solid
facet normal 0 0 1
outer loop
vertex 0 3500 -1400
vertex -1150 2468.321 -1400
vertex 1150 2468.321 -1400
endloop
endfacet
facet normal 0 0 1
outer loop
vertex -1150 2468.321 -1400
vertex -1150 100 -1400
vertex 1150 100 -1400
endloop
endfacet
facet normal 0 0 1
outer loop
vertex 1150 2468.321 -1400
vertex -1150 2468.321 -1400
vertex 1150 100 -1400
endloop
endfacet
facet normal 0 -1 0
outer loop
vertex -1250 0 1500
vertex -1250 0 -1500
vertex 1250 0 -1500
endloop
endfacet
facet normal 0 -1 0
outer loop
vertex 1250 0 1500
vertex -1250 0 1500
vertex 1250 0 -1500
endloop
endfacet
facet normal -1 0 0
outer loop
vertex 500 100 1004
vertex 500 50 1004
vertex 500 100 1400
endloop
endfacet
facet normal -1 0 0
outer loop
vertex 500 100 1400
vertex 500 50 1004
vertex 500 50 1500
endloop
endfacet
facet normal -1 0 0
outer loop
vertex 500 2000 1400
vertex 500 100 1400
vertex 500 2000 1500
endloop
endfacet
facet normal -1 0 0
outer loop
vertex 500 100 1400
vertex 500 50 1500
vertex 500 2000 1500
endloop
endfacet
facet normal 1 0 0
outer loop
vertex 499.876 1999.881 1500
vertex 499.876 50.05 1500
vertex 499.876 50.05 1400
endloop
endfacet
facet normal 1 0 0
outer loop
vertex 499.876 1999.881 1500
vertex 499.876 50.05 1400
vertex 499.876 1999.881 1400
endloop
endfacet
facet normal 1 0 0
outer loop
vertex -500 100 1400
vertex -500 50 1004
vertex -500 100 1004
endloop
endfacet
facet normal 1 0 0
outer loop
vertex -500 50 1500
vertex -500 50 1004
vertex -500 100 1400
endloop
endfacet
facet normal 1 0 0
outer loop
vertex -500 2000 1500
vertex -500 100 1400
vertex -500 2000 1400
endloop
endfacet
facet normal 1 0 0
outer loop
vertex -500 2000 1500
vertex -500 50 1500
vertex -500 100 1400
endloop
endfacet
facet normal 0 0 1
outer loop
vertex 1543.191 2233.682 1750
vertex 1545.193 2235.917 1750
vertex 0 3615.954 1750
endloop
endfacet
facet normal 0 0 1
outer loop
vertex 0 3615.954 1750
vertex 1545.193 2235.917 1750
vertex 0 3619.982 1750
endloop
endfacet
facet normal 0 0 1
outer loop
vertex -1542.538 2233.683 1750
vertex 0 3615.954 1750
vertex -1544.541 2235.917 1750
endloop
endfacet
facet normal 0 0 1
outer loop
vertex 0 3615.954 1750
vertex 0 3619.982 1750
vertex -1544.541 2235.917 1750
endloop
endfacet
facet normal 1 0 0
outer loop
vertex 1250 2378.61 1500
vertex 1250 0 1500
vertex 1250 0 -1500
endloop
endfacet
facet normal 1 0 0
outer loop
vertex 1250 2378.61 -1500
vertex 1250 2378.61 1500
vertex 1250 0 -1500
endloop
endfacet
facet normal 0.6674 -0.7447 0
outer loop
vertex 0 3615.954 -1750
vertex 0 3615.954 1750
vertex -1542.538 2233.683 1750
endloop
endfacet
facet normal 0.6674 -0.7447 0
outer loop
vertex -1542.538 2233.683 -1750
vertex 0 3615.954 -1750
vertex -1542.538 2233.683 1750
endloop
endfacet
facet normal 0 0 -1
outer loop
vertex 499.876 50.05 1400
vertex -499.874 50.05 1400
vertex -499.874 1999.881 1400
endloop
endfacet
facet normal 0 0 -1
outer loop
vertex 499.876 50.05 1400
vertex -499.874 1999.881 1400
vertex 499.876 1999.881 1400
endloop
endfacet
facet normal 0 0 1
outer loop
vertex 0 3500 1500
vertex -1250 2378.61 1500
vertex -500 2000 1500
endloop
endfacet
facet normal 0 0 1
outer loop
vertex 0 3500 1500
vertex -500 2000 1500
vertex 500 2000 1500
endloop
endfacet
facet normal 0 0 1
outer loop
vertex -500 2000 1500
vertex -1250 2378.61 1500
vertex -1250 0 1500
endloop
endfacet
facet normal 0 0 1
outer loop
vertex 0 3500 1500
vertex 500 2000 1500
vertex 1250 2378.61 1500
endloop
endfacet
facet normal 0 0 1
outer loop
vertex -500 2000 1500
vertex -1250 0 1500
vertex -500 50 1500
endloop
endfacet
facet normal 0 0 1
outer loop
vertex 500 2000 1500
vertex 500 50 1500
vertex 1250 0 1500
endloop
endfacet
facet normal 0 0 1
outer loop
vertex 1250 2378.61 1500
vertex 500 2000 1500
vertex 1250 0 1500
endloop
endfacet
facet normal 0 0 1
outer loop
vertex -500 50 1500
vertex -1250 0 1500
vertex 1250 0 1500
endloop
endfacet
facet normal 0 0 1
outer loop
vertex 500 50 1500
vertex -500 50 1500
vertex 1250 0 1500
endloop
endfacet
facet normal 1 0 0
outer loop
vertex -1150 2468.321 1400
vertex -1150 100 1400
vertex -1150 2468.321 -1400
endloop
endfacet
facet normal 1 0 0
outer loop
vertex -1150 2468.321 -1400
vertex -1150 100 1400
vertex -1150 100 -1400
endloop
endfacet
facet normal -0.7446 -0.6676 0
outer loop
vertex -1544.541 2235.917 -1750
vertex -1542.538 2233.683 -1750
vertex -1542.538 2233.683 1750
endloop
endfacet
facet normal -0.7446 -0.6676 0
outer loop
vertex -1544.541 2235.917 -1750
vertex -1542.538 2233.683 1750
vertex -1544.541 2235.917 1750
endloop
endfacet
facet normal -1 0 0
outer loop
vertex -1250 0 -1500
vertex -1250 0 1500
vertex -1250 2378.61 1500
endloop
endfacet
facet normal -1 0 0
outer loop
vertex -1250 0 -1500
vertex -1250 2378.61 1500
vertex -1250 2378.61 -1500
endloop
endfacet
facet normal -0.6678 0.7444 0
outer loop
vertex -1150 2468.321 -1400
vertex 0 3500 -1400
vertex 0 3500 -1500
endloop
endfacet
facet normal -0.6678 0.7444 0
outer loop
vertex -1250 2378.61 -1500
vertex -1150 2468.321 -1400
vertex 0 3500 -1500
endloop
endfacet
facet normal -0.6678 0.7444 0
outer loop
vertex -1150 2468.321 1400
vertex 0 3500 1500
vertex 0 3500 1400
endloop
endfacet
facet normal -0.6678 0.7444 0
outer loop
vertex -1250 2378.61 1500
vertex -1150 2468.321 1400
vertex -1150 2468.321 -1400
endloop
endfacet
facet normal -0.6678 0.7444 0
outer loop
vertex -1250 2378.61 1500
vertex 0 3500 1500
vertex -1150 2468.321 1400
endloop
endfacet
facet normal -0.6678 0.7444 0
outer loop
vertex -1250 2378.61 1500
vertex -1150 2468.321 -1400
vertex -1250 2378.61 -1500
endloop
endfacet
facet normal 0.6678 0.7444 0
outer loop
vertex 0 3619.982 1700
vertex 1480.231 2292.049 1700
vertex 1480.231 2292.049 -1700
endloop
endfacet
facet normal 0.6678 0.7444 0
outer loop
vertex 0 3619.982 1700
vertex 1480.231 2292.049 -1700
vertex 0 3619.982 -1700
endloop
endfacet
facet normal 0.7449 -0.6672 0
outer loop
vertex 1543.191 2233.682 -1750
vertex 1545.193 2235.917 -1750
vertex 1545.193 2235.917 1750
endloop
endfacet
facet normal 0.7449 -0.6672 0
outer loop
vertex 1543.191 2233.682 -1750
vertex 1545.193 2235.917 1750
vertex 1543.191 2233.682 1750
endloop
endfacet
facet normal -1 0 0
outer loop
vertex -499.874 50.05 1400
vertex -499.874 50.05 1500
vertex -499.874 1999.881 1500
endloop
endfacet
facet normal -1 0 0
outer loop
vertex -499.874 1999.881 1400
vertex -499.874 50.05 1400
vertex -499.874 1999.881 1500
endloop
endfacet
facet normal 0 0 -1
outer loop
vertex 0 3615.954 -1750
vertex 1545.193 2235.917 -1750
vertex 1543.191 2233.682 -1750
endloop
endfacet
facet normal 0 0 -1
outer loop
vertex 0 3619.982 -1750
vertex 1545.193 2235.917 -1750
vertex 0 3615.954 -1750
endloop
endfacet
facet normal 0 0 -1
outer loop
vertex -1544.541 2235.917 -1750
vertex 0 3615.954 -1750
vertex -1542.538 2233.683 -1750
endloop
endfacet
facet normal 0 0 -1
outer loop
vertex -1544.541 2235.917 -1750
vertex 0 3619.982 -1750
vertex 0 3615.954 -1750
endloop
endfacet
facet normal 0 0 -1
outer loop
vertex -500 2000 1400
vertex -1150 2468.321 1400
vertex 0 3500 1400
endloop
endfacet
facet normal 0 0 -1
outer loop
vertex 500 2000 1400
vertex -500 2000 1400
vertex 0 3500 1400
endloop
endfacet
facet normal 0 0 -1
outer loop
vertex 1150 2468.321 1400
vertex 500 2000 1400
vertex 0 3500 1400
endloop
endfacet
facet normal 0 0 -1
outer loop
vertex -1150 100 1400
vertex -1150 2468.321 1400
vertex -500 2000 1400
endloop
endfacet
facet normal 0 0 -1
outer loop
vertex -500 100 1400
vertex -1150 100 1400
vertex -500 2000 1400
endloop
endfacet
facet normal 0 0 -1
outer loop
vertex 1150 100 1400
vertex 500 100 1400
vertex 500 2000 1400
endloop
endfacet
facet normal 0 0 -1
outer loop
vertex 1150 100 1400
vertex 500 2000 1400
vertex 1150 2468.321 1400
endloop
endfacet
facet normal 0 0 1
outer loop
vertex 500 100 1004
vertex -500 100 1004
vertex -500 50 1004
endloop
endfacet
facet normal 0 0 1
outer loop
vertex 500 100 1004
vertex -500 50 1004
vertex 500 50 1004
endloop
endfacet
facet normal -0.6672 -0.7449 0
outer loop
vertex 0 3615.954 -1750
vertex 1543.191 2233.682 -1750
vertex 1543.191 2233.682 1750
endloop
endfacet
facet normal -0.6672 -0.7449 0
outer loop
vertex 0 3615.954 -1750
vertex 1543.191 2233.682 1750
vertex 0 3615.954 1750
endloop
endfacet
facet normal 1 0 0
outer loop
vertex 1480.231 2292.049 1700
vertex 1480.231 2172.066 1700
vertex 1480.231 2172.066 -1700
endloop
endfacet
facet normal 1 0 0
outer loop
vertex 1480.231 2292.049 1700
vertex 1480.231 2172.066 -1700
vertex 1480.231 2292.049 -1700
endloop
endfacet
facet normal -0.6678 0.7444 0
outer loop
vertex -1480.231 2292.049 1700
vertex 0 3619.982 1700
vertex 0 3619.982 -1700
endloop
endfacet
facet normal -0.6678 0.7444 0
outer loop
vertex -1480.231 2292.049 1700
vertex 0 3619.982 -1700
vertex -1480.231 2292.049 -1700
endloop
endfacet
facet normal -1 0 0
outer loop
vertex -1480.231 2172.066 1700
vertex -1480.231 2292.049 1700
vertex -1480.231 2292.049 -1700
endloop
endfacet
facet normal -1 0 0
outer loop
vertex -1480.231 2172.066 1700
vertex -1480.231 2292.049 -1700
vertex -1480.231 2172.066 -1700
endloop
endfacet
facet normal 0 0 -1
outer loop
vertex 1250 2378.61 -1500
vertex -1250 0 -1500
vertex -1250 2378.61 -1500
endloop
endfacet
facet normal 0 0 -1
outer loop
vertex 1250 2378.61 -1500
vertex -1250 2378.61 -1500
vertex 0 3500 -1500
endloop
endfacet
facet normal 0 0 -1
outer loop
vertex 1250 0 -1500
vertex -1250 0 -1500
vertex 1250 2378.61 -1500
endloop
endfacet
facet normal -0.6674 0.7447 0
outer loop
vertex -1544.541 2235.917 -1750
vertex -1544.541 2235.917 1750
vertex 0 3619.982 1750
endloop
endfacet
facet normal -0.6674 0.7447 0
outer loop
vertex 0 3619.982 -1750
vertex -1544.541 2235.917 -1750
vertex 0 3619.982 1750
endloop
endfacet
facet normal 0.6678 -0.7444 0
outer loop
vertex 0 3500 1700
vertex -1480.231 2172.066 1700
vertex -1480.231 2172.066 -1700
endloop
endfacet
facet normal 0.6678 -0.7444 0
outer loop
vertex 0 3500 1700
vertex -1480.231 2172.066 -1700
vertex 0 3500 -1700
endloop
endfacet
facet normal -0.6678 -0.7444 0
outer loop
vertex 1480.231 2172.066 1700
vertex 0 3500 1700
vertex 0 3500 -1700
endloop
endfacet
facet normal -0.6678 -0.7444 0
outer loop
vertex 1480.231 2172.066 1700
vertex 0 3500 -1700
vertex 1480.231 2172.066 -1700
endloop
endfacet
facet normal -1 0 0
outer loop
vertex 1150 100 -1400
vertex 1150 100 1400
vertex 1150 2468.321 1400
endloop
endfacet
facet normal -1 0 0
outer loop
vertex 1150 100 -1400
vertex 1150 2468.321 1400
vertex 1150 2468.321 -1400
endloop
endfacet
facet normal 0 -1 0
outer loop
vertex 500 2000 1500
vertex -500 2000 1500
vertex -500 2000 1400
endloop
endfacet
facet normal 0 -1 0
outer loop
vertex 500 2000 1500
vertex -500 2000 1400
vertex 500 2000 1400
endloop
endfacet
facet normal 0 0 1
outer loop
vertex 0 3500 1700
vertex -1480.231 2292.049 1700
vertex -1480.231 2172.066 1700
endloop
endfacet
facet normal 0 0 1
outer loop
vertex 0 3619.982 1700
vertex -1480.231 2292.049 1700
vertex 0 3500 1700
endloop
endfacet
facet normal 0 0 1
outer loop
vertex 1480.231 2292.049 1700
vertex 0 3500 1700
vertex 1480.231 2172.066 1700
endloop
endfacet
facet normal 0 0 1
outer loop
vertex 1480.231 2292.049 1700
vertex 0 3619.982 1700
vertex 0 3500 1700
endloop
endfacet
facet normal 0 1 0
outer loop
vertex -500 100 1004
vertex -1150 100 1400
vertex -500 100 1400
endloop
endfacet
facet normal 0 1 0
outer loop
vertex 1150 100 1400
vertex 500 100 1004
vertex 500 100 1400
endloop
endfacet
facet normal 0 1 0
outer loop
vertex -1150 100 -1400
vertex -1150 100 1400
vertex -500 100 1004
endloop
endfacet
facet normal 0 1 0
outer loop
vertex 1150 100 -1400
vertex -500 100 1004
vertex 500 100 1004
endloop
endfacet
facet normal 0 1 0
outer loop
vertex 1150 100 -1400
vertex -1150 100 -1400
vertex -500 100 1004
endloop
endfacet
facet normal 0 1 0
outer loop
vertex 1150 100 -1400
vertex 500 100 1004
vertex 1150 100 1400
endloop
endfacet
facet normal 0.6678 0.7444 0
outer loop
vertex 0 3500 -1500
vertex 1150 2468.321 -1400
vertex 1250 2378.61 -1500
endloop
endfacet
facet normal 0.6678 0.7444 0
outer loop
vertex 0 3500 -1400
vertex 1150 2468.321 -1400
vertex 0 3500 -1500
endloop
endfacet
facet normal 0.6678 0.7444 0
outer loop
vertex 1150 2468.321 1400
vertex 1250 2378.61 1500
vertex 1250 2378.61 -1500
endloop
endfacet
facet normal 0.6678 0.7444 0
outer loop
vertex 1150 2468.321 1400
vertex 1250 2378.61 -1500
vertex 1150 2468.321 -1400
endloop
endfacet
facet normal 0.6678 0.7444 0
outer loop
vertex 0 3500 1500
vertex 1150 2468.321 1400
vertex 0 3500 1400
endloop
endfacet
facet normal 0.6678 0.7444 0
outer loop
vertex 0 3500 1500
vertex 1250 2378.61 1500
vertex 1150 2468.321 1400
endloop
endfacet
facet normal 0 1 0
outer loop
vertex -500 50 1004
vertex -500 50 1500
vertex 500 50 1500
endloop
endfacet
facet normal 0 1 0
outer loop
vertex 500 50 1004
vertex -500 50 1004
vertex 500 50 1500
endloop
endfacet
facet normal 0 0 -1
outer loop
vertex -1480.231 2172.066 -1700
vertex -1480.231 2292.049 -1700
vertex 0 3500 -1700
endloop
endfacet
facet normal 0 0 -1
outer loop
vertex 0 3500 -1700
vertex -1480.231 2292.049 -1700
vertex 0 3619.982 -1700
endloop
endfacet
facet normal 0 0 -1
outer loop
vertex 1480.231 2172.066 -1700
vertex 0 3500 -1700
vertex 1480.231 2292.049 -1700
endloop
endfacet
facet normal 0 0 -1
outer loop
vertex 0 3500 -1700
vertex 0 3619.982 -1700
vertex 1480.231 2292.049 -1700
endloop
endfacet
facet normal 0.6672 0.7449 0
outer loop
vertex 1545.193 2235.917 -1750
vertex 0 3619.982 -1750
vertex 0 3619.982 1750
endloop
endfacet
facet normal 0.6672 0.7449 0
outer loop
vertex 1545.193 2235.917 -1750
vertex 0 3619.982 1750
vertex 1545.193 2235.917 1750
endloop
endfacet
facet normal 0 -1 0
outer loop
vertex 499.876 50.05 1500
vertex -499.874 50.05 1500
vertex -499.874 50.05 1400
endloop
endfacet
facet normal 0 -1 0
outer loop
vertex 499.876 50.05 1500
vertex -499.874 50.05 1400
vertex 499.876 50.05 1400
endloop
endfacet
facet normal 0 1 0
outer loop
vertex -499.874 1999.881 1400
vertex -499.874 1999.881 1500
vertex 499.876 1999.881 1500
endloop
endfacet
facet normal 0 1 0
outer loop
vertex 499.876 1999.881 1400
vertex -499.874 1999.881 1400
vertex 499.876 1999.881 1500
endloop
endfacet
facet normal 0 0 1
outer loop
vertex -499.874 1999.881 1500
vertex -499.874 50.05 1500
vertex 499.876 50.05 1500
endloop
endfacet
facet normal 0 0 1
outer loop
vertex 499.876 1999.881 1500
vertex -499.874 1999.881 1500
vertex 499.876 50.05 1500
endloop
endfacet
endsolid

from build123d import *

# Parameters (mm, degrees)
SKETCH1_W                = 2500
SKETCH1_H                = 3000
BOSS_EXTRUDE1_DEPTH      = 3500
CUT_EXTRUDE1_DEPTH       = 3500
SHELL1_T                 = -100
SKETCH3_W                = 1000
SKETCH3_H                = 1950
CUT_EXTRUDE3_DEPTH       = 496
SKETCH4_W                = 999.750286032
SKETCH4_H                = 1949.830893164
BOSS_EXTRUDE2_DEPTH      = 100
BOSS_EXTRUDE3_DEPTH      = 200
BOSS_EXTRUDE3_DEPTH_BACK = 3200
EXTRUDE_THIN1_DEPTH      = 50
EXTRUDE_THIN1_DEPTH_BACK = 3450


with BuildPart() as part:
    # Sketch1 → Boss-Extrude1 (new body)
    with BuildSketch(Plane(origin=(0, 0, 0), x_dir=(1, 0, 0), z_dir=(0, 1, 0))):
        Rectangle(SKETCH1_W, SKETCH1_H)
    extrude(amount=BOSS_EXTRUDE1_DEPTH)

    # Sketch2 → Cut-Extrude1 (cut)
    with BuildSketch(Plane.XY.offset(1500)):
        Polygon((0, 3500), (-1250, 2378.609609687), (-1250, 3819.872542734), (1250, 3819.872542734), (1250, 2378.609609687), align=None)
    extrude(amount=-CUT_EXTRUDE1_DEPTH, mode=Mode.SUBTRACT)

    # Shell1
    shell1_openings = [part.faces().sort_by_distance(p)[0] for p in [
        (625, 2939.304804843, 0),
        (-625, 2939.304804843, 0),
    ]]
    offset(amount=SHELL1_T, openings=shell1_openings, kind=Kind.INTERSECTION)

    # Sketch3 → Cut-Extrude3 (cut)
    with BuildSketch(Plane.XY.offset(1500)):
        with Locations((0, 1025)):
            Rectangle(SKETCH3_W, SKETCH3_H)
    extrude(amount=-CUT_EXTRUDE3_DEPTH, mode=Mode.SUBTRACT)


with BuildPart() as body_2:
    # Sketch4 → Boss-Extrude2 (new body)
    with BuildSketch(Plane.XY.offset(1500)):
        with Locations((0.000917564, 1024.965737465)):
            Rectangle(SKETCH4_W, SKETCH4_H)
    extrude(amount=-BOSS_EXTRUDE2_DEPTH)


with BuildPart() as body_3:
    # Sketch5 → Boss-Extrude3 (new, two sides: drawn at the far end of the back side and taken through both)
    with BuildSketch(Plane(origin=(0, 0, -1500), x_dir=(-1, 0, 0), z_dir=(0, 0, -1)).offset(-BOSS_EXTRUDE3_DEPTH_BACK)):
        Polygon((0, 3500), (-1480.231275032, 2172.066298191), (-1480.231275032, 2292.048640299), (0, 3619.982342108), (1480.231275032, 2292.048640299), (1480.231275032, 2172.066298191), align=None)
    extrude(amount=BOSS_EXTRUDE3_DEPTH + BOSS_EXTRUDE3_DEPTH_BACK)


with BuildPart() as body_4:
    # Sketch6 → Extrude-Thin1 (new, two sides: drawn at the far end of the back side and taken through both)
    with BuildSketch(Plane.XY.offset(1700).offset(-EXTRUDE_THIN1_DEPTH_BACK)):
        Polygon((-1544.54053077, 2235.916805511), (0, 3619.982342108), (1545.192552172, 2235.916805511), (1543.19094317, 2233.682177712), (0.000422446, 3615.954447362), (-1542.538453075, 2233.682597619), align=None)
    extrude(amount=EXTRUDE_THIN1_DEPTH + EXTRUDE_THIN1_DEPTH_BACK)


solid = Compound([part.part, body_2.part, body_3.part, body_4.part])
